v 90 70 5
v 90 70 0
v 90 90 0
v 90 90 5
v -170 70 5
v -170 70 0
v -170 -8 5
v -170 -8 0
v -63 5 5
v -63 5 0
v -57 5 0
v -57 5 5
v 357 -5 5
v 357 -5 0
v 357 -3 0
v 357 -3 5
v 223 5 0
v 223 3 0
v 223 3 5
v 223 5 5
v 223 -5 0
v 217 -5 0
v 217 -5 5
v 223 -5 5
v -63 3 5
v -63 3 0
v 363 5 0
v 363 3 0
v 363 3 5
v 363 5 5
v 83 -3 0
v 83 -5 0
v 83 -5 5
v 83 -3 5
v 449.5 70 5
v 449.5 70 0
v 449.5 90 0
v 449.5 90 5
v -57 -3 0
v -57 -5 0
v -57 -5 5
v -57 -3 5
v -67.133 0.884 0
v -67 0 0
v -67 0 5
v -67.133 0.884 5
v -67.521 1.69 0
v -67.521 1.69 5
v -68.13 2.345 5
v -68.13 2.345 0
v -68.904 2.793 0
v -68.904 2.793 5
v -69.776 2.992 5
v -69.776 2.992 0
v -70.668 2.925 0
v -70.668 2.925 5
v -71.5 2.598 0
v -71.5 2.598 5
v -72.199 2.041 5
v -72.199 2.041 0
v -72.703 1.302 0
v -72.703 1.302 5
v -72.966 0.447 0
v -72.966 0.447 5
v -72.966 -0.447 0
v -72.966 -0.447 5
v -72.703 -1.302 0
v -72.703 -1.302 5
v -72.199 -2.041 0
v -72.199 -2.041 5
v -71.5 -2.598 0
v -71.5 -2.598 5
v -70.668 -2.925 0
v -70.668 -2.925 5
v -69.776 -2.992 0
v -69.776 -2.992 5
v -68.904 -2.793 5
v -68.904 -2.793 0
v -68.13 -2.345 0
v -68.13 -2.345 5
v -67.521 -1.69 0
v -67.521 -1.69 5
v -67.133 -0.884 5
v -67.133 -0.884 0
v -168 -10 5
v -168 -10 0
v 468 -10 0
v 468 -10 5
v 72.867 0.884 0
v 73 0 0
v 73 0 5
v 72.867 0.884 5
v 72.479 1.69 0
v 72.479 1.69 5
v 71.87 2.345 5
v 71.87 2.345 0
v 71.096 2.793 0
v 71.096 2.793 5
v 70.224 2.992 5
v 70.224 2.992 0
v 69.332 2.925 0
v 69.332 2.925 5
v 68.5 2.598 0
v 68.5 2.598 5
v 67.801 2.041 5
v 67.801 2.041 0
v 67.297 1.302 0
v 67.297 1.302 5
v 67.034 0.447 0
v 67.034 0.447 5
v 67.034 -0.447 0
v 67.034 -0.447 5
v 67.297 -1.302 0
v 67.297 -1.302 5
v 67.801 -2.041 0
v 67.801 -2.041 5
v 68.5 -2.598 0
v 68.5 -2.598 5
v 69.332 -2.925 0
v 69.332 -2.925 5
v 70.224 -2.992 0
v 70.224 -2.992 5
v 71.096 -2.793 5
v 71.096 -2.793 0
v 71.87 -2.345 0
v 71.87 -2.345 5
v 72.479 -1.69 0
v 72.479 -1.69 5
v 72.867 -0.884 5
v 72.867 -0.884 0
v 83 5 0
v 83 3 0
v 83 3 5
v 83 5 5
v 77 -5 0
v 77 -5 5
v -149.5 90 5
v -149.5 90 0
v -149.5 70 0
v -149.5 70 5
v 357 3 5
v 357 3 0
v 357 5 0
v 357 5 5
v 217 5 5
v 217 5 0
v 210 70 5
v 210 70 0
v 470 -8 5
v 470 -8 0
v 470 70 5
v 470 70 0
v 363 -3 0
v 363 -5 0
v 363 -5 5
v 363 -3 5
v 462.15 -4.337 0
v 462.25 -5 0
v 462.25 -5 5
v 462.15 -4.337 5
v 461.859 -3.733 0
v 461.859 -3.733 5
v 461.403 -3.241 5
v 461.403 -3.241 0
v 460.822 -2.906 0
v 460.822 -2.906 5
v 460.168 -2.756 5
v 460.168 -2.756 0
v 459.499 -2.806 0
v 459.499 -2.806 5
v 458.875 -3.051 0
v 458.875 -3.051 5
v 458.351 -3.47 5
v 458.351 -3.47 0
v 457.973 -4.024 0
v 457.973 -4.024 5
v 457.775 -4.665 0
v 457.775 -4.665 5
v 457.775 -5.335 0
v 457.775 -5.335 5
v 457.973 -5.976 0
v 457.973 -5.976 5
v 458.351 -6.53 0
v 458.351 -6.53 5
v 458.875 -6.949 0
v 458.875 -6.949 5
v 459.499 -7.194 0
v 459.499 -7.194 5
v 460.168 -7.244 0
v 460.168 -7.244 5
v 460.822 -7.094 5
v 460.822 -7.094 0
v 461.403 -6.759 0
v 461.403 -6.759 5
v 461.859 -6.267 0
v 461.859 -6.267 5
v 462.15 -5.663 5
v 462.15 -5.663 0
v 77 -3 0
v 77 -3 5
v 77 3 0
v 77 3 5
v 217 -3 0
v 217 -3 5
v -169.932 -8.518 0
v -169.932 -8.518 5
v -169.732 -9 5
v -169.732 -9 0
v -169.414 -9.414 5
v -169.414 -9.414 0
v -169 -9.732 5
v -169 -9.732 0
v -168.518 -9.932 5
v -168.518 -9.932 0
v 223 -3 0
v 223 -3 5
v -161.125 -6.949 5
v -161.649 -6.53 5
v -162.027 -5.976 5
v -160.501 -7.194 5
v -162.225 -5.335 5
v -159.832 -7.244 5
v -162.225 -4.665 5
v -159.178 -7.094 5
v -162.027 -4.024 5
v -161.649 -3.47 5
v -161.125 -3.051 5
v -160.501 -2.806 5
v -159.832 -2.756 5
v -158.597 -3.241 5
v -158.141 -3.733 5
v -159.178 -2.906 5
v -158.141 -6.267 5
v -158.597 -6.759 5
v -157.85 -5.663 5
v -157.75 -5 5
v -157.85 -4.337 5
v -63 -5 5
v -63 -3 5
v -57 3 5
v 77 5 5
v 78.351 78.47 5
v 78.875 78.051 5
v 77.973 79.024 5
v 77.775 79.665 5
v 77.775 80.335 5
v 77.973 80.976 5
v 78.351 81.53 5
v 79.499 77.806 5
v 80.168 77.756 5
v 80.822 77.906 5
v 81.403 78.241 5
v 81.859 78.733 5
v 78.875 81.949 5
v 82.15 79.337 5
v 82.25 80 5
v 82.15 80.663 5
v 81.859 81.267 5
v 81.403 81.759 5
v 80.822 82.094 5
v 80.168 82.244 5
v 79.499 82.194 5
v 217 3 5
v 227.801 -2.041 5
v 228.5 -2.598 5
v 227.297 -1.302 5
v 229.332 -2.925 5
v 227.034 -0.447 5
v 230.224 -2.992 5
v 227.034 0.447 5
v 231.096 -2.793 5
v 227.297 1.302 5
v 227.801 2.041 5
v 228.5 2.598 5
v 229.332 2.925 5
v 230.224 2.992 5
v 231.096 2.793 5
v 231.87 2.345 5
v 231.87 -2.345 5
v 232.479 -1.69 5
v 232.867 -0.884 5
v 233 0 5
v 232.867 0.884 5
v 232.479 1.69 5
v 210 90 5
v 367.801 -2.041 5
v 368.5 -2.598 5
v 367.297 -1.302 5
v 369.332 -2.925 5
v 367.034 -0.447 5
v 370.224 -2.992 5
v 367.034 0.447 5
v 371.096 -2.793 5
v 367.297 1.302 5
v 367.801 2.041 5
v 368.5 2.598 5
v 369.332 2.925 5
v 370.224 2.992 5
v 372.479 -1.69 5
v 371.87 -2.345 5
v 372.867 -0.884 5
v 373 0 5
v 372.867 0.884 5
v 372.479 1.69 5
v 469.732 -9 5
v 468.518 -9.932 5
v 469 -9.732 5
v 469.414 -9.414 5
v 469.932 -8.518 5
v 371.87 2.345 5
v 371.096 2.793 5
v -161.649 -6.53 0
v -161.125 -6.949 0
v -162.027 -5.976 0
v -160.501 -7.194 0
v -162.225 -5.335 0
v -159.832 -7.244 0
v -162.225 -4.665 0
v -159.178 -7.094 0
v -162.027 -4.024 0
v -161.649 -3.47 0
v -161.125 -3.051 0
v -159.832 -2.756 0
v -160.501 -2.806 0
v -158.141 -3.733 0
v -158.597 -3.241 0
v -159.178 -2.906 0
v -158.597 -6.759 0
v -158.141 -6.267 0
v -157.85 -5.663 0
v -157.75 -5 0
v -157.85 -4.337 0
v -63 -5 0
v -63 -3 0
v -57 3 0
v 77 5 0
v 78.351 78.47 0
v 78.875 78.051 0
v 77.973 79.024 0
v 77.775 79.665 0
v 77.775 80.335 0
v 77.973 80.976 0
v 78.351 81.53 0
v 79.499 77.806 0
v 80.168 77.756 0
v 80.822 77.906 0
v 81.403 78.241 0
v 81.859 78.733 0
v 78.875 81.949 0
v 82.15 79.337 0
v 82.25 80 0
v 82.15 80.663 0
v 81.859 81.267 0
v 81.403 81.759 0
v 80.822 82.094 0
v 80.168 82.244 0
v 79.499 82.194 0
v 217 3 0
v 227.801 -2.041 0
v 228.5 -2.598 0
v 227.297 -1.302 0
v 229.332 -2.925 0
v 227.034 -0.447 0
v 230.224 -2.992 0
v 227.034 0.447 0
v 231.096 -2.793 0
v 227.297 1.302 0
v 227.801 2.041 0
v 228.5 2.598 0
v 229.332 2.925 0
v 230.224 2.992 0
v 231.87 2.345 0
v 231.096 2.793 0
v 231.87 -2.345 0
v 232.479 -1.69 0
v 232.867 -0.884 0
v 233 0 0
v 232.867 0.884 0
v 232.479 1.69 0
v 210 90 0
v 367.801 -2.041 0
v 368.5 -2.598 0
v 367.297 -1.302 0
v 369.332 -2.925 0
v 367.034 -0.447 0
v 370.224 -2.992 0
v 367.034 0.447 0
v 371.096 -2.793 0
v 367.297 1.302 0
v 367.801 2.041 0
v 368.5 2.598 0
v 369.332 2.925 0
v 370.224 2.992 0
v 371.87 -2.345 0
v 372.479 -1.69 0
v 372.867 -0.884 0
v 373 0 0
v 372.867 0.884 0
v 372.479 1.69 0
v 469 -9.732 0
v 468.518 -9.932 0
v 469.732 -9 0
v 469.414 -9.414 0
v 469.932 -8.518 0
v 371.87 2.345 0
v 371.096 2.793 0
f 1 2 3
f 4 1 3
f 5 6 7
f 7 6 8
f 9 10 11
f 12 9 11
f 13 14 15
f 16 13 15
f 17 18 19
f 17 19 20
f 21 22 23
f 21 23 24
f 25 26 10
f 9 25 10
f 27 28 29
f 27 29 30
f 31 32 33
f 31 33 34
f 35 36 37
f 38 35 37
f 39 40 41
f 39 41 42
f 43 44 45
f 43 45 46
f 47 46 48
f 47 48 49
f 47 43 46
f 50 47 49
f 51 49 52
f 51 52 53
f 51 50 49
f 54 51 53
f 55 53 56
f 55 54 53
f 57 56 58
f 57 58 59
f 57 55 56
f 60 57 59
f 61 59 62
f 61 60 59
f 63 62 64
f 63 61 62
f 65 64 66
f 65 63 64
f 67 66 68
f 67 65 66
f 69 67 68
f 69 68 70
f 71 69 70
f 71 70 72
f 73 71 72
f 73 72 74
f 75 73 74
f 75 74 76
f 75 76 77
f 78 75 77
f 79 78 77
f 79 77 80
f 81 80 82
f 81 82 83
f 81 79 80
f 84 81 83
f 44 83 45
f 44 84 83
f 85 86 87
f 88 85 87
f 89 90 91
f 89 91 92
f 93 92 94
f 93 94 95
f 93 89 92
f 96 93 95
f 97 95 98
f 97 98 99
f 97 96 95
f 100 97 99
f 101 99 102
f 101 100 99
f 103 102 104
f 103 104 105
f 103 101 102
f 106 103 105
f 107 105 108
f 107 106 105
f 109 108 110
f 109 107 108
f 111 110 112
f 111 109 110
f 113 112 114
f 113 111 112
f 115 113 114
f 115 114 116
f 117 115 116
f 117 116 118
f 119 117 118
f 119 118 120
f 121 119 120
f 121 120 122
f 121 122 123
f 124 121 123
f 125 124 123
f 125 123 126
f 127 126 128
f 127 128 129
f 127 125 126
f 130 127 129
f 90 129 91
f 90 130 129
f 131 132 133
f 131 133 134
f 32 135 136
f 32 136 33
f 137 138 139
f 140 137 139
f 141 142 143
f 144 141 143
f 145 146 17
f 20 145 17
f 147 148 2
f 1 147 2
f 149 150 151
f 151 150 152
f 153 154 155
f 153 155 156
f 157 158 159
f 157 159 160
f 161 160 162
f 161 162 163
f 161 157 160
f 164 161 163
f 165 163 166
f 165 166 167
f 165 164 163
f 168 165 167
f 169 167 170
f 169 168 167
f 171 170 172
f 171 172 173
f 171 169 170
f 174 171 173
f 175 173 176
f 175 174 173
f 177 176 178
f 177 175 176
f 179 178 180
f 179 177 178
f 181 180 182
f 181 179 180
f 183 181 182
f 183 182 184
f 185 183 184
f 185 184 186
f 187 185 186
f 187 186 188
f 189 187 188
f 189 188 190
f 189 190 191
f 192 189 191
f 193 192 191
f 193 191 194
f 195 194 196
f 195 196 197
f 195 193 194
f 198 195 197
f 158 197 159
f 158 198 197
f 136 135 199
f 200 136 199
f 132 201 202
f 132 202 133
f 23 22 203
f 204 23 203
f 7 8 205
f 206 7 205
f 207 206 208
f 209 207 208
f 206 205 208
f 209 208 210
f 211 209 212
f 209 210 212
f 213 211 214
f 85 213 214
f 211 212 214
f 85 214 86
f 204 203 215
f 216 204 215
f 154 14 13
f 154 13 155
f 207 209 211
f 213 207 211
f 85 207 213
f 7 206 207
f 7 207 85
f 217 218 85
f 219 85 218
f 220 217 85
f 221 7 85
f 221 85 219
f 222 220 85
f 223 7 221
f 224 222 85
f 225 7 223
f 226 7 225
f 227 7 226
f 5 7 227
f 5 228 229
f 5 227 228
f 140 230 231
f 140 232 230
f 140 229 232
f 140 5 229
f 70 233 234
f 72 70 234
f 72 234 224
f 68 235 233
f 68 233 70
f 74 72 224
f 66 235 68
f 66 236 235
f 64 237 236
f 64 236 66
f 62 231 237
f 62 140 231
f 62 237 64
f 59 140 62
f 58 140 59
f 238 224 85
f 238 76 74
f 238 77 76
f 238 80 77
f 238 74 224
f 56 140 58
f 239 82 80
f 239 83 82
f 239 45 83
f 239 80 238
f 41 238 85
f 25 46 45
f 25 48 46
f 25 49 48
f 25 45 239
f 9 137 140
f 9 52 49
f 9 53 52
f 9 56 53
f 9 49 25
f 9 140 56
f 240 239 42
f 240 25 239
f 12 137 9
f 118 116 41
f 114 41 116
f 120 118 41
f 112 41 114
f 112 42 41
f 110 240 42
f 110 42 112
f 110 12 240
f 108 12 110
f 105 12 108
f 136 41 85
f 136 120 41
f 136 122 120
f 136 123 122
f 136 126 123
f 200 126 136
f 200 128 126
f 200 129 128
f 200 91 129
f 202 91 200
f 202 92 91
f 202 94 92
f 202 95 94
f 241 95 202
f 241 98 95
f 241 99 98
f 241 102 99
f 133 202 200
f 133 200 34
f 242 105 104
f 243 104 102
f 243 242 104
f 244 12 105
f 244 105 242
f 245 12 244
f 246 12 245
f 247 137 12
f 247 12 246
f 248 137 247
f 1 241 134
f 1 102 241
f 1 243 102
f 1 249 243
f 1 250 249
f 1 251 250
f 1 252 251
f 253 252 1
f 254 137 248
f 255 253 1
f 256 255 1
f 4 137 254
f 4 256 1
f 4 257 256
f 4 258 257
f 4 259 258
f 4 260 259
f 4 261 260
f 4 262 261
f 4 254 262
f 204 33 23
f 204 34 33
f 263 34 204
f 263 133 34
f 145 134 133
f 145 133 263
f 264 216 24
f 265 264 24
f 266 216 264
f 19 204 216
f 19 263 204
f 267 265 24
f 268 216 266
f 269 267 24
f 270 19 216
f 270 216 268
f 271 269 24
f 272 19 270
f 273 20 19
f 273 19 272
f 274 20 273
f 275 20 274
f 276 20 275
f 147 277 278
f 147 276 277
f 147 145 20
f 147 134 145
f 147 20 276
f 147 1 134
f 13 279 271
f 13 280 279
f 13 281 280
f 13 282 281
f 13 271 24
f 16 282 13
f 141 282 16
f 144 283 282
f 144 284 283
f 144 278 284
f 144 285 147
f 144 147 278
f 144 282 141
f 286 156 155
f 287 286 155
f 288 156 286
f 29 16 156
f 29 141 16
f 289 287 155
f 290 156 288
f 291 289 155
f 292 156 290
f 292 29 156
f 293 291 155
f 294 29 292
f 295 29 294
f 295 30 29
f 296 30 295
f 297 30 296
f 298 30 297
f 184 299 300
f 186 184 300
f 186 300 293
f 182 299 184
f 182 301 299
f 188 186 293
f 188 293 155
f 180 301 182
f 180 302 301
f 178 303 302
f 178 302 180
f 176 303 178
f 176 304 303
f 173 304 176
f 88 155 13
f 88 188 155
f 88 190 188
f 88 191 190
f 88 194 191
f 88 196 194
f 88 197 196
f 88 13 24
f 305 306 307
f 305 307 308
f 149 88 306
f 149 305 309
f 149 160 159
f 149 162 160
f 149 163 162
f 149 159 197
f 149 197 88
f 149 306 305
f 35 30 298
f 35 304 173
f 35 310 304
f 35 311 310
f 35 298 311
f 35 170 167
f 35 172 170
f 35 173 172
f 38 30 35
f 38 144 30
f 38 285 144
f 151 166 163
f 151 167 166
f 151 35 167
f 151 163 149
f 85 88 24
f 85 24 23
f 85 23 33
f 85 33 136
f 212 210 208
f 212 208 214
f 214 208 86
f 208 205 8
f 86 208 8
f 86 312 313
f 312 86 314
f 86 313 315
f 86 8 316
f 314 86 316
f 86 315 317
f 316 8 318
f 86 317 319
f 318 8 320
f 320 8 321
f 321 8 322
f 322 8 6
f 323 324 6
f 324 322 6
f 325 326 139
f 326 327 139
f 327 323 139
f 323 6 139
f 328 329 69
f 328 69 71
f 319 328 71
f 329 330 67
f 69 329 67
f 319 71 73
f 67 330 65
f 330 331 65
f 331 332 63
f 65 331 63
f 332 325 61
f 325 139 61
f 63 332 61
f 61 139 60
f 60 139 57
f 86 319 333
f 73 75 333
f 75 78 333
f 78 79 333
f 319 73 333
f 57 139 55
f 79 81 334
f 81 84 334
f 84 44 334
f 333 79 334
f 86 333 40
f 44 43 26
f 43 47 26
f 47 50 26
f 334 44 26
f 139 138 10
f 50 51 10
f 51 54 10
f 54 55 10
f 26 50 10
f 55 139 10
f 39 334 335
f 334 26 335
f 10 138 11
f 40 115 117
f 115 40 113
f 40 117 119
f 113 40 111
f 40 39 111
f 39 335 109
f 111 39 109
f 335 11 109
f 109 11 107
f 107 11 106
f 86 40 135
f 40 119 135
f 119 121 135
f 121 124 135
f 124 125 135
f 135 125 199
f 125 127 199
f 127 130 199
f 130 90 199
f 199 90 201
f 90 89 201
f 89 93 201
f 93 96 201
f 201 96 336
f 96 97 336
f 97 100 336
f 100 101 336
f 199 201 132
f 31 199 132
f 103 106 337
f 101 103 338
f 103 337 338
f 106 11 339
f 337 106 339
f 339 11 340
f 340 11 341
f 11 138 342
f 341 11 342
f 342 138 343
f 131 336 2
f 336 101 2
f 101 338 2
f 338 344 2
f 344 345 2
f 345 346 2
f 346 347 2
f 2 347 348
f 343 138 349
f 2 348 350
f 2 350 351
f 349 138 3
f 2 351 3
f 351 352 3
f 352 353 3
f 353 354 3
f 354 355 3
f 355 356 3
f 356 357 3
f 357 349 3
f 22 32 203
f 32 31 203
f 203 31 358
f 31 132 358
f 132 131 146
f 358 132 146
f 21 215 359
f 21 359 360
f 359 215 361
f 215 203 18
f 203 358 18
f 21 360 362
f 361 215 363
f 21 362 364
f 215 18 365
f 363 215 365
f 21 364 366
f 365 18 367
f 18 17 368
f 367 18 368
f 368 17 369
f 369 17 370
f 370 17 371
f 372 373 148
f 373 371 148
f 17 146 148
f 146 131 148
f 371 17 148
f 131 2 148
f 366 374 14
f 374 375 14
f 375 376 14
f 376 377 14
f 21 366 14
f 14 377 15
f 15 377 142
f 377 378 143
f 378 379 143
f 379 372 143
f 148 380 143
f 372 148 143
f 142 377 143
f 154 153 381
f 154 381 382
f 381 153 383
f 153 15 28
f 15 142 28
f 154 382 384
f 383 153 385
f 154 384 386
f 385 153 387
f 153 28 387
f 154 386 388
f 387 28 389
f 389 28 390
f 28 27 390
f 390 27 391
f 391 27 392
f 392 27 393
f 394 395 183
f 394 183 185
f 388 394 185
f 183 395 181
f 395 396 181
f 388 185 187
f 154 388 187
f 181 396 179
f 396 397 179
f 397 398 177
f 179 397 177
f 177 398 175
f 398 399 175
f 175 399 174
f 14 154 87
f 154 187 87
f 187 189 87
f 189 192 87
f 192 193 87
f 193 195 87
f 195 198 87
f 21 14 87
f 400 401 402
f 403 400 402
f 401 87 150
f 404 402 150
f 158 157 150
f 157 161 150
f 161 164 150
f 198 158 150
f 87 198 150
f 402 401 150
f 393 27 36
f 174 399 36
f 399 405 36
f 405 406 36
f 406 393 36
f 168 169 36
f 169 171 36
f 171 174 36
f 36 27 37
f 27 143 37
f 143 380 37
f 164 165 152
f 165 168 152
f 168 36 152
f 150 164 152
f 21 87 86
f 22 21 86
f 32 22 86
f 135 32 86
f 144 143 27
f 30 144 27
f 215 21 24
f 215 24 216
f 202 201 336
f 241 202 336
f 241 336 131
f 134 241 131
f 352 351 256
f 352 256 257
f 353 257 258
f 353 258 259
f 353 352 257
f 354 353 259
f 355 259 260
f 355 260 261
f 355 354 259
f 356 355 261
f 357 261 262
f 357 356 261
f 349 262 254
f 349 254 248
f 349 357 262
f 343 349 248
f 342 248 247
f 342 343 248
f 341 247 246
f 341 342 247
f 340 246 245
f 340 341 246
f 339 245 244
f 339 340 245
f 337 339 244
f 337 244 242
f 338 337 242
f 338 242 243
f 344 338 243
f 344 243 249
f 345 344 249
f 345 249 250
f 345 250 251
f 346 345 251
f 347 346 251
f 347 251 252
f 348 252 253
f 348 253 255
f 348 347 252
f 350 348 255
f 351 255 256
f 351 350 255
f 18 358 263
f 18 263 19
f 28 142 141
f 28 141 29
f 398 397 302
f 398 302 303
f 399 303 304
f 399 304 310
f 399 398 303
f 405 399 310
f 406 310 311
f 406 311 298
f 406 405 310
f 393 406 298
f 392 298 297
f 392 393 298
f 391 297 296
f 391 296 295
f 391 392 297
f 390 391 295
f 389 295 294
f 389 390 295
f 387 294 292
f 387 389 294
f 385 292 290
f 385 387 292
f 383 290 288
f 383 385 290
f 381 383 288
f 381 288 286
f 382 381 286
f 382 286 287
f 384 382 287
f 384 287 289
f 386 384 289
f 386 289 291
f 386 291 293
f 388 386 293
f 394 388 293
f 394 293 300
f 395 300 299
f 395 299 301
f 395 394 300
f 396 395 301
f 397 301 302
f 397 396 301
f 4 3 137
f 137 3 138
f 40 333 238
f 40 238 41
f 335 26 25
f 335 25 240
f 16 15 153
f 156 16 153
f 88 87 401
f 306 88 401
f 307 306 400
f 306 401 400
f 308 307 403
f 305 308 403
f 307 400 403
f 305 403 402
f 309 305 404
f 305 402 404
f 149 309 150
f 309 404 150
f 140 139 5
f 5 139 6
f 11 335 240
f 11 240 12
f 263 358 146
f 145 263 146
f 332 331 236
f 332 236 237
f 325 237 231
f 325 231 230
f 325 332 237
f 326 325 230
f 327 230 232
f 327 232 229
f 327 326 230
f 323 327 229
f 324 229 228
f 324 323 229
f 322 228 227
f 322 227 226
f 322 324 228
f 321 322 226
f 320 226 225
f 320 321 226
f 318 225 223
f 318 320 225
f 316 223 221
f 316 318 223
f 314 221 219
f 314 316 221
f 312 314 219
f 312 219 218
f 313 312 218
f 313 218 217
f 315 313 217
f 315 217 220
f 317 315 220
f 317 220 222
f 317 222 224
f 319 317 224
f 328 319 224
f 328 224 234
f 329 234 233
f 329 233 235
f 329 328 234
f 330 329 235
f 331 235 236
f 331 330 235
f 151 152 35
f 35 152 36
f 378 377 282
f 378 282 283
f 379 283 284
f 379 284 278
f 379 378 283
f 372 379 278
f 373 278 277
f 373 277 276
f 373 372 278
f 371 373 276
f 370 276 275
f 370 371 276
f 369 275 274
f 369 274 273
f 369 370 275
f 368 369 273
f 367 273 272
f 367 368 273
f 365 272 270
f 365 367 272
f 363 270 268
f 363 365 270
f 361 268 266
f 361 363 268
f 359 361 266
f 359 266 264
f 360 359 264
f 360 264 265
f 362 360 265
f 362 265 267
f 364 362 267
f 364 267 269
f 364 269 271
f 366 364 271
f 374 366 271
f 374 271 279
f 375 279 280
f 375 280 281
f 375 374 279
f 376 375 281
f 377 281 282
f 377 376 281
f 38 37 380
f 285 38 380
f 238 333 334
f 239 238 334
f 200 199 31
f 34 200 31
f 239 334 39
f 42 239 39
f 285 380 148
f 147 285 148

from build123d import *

# Parameters (mm, degrees)
F0_R     = 2.25
F0_W     = 6
F0_H     = 2
F0_R_2   = 3
F1_DEPTH = 5


with BuildPart() as f1:
    # F0 (on Top) → F1 (new body)
    with BuildSketch(Plane.XY):
        with BuildLine():
            ThreePointArc((-170, -8), (-169.414214, -9.414214), (-168, -10))
            Line((-168, -10), (468, -10))
            ThreePointArc((468, -10), (469.414214, -9.414214), (470, -8))
            Line((470, -8), (470, 70))
            Line((470, 70), (449.5, 70))
            Line((449.5, 70), (449.5, 90))
            Line((449.5, 90), (210, 90))
            Line((210, 90), (210, 70))
            Line((210, 70), (90, 70))
            Line((90, 70), (90, 90))
            Line((90, 90), (-149.5, 90))
            Line((-149.5, 90), (-149.5, 70))
            Line((-149.5, 70), (-170, 70))
            Line((-170, 70), (-170, -8))
        make_face()
        with Locations((-160, -5)):
            Circle(F0_R, mode=Mode.SUBTRACT)
        with Locations((-60, -4)):
            Rectangle(F0_W, F0_H, mode=Mode.SUBTRACT)
        with Locations((-70, 0)):
            Circle(F0_R_2, mode=Mode.SUBTRACT)
        with Locations((-60, 4)):
            Rectangle(F0_W, F0_H, mode=Mode.SUBTRACT)
        with Locations((80, -4)):
            Rectangle(F0_W, F0_H, mode=Mode.SUBTRACT)
        with Locations((70, 0)):
            Circle(F0_R_2, mode=Mode.SUBTRACT)
        with Locations((80, 4)):
            Rectangle(F0_W, F0_H, mode=Mode.SUBTRACT)
        with Locations((220, -4)):
            Rectangle(F0_W, F0_H, mode=Mode.SUBTRACT)
        with Locations((230, 0)):
            Circle(F0_R_2, mode=Mode.SUBTRACT)
        with Locations((220, 4)):
            Rectangle(F0_W, F0_H, mode=Mode.SUBTRACT)
        with Locations((360, -4)):
            Rectangle(F0_W, F0_H, mode=Mode.SUBTRACT)
        with Locations((370, 0)):
            Circle(F0_R_2, mode=Mode.SUBTRACT)
        with Locations((460, -5)):
            Circle(F0_R, mode=Mode.SUBTRACT)
        with Locations((360, 4)):
            Rectangle(F0_W, F0_H, mode=Mode.SUBTRACT)
        with Locations((80, 80)):
            Circle(F0_R, mode=Mode.SUBTRACT)
    extrude(amount=F1_DEPTH)


solid = f1.part
